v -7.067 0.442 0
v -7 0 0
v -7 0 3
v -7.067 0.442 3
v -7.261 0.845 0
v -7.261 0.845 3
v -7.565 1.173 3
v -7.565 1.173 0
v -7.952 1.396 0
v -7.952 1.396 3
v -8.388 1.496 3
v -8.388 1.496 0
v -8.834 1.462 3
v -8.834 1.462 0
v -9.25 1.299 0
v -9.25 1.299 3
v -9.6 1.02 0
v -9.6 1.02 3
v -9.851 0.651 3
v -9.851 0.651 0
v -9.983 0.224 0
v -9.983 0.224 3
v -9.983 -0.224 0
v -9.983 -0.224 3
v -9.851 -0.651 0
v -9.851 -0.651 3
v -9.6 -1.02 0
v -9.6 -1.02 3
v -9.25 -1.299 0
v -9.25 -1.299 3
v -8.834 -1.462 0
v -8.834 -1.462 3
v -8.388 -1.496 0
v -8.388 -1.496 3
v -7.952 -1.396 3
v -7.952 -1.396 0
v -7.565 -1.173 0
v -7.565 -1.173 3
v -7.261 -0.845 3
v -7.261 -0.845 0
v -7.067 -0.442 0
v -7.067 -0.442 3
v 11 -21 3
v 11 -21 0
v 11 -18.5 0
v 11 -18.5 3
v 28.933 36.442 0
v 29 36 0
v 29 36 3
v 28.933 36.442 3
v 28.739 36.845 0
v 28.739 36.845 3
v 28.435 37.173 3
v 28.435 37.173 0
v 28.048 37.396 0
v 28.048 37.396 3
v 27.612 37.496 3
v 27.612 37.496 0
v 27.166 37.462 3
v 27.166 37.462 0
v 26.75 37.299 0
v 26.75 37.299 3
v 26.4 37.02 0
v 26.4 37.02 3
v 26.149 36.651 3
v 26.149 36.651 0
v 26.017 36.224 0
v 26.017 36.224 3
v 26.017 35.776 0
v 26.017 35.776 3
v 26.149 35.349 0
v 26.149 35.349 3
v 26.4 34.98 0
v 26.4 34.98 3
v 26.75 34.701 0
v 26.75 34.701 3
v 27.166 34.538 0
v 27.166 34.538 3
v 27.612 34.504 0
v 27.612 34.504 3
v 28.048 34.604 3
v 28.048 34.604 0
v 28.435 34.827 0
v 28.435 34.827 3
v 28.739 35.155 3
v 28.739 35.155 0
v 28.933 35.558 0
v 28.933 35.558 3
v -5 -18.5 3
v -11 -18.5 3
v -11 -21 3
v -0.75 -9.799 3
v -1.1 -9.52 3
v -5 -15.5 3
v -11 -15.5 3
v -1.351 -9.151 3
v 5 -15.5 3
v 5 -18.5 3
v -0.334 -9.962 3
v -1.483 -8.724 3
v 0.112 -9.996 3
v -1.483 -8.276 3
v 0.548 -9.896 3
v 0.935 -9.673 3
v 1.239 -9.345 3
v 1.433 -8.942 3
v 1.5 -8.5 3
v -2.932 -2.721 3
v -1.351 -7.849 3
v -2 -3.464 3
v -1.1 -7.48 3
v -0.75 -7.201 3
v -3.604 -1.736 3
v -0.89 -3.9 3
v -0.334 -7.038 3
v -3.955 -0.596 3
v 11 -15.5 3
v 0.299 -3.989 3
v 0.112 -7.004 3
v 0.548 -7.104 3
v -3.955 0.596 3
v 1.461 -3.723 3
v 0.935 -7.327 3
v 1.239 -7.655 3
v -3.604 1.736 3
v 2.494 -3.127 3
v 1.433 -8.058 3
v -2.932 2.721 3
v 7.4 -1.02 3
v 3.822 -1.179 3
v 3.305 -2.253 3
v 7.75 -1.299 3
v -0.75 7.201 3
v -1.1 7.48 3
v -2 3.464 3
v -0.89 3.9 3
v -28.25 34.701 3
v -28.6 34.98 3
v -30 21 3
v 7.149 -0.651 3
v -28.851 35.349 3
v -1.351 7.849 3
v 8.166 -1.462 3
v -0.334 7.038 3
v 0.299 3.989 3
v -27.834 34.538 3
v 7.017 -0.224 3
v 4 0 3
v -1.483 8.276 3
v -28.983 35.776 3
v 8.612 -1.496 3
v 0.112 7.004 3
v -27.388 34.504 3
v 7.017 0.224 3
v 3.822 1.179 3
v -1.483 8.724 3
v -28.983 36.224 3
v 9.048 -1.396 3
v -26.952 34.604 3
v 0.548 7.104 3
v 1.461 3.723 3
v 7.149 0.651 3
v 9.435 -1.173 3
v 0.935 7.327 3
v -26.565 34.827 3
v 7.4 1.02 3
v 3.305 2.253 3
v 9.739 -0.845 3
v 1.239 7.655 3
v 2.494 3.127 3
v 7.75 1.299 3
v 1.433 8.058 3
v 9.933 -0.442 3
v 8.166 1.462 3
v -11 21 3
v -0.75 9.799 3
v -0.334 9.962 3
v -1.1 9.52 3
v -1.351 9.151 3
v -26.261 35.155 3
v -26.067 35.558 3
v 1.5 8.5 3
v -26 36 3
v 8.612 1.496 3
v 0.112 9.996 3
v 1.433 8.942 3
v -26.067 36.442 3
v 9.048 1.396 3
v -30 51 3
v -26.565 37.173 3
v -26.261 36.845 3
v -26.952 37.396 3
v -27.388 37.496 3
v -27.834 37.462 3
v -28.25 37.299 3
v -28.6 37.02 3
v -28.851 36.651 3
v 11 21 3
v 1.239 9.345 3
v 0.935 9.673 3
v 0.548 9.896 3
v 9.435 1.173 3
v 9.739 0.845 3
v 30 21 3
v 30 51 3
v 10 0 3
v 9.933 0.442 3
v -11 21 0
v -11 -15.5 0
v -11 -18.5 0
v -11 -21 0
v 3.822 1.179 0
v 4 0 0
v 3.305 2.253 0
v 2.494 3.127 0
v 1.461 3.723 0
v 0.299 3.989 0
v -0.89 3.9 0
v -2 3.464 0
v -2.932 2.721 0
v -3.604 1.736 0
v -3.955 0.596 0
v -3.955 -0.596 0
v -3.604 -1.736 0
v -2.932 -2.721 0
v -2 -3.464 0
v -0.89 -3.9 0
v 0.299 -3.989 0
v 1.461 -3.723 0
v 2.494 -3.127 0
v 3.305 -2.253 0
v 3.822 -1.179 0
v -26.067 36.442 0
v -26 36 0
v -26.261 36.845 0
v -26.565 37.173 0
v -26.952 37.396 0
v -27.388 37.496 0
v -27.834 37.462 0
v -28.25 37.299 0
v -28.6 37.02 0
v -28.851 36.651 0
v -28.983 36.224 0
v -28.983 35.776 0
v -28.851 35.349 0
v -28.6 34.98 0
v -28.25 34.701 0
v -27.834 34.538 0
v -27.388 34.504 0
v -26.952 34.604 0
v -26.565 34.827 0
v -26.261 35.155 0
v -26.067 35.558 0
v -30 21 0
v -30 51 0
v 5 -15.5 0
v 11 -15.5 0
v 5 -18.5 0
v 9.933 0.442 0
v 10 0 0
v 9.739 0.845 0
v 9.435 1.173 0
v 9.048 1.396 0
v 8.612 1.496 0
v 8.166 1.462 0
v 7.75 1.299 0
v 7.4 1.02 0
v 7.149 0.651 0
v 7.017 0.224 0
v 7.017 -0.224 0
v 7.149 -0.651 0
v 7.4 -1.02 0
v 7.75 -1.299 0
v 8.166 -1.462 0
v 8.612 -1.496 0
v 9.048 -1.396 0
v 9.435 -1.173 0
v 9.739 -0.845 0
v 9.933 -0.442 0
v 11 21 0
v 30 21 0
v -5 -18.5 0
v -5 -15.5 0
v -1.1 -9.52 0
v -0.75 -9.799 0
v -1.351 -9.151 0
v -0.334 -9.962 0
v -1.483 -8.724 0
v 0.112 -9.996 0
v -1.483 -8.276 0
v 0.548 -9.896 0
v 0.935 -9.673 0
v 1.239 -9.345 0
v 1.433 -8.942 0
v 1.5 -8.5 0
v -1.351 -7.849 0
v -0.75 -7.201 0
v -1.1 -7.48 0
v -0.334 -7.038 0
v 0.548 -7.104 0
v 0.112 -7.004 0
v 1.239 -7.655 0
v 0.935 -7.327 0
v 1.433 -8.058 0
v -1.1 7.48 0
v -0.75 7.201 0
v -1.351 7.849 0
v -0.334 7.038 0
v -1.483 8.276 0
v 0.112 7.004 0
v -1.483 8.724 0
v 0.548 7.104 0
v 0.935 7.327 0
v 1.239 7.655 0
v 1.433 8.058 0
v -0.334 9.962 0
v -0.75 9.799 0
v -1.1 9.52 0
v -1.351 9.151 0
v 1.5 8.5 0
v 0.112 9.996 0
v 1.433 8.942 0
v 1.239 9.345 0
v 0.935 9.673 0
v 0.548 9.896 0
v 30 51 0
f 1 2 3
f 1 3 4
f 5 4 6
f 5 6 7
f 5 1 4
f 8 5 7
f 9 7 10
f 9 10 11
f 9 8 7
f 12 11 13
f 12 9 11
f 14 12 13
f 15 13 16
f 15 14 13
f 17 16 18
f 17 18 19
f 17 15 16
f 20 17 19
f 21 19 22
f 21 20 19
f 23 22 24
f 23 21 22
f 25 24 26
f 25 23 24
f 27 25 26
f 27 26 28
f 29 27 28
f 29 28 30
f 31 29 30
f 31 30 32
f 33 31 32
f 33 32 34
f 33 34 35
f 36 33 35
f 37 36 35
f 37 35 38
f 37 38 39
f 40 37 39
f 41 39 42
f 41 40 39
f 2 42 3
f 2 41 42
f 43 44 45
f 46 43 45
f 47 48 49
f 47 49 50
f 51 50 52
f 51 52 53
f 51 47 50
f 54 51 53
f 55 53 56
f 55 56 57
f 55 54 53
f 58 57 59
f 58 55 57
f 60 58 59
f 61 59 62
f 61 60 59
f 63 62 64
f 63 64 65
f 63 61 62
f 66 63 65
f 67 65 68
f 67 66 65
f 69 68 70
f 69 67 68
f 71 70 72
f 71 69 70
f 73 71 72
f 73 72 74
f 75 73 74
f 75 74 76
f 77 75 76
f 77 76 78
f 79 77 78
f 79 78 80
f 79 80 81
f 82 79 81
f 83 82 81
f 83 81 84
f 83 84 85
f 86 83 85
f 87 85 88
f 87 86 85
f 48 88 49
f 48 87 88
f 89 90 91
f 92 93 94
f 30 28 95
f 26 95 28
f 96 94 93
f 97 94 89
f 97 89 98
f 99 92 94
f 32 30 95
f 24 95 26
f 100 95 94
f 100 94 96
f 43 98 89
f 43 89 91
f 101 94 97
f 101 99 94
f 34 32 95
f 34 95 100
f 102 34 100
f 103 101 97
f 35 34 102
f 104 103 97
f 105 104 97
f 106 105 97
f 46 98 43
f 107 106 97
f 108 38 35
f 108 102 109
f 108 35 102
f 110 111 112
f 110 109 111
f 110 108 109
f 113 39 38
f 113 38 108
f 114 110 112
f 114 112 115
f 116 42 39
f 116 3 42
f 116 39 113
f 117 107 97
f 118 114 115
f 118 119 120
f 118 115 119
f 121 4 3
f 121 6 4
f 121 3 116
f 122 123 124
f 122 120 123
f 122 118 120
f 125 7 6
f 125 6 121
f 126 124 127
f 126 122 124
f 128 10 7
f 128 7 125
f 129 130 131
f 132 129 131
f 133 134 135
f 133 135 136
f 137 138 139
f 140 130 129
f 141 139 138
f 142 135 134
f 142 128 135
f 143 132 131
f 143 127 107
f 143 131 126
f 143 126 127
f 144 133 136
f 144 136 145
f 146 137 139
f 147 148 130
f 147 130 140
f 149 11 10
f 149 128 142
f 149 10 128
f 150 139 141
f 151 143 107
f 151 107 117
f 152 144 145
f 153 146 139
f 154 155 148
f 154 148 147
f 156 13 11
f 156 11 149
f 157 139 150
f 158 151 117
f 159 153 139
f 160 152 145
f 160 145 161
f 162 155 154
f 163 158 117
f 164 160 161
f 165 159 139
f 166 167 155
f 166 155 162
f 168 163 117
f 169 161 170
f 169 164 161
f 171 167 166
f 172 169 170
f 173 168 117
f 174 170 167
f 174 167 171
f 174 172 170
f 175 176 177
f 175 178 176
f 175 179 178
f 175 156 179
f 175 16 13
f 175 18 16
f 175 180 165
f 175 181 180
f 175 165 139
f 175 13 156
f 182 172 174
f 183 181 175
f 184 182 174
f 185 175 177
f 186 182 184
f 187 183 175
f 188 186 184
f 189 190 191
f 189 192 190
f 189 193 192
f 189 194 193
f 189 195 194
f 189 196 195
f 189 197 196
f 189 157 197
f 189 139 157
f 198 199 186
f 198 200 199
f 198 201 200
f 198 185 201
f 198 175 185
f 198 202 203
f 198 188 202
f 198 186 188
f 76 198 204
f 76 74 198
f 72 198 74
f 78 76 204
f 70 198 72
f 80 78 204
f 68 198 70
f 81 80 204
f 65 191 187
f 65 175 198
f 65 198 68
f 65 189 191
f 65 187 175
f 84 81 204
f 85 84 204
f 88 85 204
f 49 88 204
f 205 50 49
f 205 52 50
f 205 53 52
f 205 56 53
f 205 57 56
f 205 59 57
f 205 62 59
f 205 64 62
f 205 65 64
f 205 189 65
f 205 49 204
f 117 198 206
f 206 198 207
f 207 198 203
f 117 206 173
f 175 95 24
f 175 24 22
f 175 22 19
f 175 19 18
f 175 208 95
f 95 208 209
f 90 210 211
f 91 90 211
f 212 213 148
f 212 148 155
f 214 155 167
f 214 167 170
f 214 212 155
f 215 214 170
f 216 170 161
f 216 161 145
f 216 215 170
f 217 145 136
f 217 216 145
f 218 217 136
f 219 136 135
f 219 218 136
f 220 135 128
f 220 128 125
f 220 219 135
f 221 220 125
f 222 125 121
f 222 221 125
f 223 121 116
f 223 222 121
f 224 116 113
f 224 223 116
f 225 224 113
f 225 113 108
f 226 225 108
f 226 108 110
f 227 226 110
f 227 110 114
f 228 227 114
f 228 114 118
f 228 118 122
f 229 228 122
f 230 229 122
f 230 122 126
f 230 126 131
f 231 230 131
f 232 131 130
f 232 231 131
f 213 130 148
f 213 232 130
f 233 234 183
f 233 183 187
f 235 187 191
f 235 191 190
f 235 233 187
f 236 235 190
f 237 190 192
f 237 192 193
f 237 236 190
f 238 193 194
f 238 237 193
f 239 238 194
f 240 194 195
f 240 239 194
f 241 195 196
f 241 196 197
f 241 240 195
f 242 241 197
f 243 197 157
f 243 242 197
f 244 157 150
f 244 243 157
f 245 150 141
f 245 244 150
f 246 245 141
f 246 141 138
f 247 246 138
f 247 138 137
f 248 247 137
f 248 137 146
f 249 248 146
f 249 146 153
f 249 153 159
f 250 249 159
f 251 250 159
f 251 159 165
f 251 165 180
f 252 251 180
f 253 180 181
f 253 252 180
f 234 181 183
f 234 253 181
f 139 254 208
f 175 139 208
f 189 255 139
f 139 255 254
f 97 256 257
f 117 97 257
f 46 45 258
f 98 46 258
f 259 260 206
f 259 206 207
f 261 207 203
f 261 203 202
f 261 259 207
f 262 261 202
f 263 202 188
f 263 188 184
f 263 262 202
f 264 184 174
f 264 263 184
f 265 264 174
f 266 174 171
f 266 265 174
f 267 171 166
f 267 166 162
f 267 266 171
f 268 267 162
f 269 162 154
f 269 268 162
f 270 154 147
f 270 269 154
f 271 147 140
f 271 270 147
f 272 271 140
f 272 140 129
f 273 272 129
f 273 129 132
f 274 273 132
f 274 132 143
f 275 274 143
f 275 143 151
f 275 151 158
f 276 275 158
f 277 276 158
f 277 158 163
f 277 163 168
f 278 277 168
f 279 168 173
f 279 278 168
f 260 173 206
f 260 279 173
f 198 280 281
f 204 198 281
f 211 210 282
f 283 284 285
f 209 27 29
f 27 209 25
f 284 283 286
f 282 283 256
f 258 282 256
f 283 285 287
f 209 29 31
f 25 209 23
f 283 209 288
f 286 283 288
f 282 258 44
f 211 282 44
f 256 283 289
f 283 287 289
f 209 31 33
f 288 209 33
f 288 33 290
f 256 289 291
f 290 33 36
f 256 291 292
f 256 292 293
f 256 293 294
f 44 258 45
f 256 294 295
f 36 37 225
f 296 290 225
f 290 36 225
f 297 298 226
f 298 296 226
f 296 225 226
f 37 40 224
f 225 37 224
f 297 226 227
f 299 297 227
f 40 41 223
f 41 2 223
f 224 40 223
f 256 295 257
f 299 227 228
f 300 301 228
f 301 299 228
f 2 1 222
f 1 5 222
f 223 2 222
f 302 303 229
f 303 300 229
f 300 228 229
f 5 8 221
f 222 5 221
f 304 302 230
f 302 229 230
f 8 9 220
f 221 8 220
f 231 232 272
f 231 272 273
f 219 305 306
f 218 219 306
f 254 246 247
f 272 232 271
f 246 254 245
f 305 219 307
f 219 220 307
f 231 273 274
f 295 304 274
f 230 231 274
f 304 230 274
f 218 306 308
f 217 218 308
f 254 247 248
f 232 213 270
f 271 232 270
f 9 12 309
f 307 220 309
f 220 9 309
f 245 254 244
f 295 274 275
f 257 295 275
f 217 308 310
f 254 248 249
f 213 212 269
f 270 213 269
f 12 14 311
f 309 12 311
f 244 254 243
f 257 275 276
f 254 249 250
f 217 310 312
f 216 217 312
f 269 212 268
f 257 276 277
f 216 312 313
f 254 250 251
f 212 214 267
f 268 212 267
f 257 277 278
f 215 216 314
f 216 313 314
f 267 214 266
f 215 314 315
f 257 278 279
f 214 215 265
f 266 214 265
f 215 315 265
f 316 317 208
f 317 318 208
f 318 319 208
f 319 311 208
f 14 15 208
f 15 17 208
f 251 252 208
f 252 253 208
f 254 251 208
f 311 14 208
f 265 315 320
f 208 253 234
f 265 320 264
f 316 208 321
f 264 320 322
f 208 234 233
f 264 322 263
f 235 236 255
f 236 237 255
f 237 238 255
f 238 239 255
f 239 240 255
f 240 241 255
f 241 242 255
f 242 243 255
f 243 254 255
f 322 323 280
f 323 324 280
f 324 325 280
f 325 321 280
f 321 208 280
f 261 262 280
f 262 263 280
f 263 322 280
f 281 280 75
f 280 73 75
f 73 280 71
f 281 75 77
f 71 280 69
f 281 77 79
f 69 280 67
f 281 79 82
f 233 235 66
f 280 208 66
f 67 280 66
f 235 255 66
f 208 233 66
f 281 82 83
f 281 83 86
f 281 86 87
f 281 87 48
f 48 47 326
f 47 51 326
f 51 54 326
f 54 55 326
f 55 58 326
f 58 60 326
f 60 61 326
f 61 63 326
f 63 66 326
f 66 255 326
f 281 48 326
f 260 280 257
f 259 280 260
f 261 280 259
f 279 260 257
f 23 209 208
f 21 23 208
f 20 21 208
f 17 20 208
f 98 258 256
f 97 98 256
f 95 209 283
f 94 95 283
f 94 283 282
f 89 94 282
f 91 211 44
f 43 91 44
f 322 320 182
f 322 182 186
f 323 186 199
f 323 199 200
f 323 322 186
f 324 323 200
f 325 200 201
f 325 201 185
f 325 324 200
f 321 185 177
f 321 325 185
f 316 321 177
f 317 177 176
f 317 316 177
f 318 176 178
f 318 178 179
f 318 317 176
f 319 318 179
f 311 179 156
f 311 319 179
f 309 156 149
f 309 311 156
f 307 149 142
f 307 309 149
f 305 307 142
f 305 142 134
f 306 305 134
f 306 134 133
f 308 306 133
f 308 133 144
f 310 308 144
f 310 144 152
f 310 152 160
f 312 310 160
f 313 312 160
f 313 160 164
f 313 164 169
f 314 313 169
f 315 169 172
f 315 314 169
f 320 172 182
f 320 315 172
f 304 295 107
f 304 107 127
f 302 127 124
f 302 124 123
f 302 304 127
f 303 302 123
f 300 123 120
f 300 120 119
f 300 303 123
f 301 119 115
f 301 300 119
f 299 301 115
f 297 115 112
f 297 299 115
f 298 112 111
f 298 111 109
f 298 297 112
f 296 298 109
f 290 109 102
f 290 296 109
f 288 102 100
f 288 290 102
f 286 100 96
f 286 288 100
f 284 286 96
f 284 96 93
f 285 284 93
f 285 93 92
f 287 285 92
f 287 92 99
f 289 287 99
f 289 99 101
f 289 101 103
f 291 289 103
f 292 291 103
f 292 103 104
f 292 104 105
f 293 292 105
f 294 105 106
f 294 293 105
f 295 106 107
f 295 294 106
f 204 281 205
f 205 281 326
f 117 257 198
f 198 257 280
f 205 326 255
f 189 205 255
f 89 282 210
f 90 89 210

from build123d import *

# Parameters (mm, degrees)
SKETCH1_R           = 1.5
SKETCH1_R_2         = 4
BOSS_EXTRUDE1_DEPTH = 3


with BuildPart() as part:
    # Sketch1 → Boss-Extrude1 (new body)
    with BuildSketch(Plane.XY):
        Polygon((-11, 0), (-11, -15.5), (-5, -15.5), (-5, -18.5), (-11, -18.5), (-11, -21), (11, -21), (11, -18.5), (5, -18.5), (5, -15.5), (11, -15.5), (11, 0), (11, 21), (30, 21), (30, 51), (-30, 51), (-30, 21), (-11, 21), align=None)
        with Locations((0, 8.5)):
            Circle(SKETCH1_R, mode=Mode.SUBTRACT)
        with Locations((8.5, 0)):
            Circle(SKETCH1_R, mode=Mode.SUBTRACT)
        with Locations((0, -8.5)):
            Circle(SKETCH1_R, mode=Mode.SUBTRACT)
        with Locations((-8.5, 0)):
            Circle(SKETCH1_R, mode=Mode.SUBTRACT)
        with Locations((-27.5, 36)):
            Circle(SKETCH1_R, mode=Mode.SUBTRACT)
        with Locations((27.5, 36)):
            Circle(SKETCH1_R, mode=Mode.SUBTRACT)
        Circle(SKETCH1_R_2, mode=Mode.SUBTRACT)
    extrude(amount=BOSS_EXTRUDE1_DEPTH)


solid = part.part
